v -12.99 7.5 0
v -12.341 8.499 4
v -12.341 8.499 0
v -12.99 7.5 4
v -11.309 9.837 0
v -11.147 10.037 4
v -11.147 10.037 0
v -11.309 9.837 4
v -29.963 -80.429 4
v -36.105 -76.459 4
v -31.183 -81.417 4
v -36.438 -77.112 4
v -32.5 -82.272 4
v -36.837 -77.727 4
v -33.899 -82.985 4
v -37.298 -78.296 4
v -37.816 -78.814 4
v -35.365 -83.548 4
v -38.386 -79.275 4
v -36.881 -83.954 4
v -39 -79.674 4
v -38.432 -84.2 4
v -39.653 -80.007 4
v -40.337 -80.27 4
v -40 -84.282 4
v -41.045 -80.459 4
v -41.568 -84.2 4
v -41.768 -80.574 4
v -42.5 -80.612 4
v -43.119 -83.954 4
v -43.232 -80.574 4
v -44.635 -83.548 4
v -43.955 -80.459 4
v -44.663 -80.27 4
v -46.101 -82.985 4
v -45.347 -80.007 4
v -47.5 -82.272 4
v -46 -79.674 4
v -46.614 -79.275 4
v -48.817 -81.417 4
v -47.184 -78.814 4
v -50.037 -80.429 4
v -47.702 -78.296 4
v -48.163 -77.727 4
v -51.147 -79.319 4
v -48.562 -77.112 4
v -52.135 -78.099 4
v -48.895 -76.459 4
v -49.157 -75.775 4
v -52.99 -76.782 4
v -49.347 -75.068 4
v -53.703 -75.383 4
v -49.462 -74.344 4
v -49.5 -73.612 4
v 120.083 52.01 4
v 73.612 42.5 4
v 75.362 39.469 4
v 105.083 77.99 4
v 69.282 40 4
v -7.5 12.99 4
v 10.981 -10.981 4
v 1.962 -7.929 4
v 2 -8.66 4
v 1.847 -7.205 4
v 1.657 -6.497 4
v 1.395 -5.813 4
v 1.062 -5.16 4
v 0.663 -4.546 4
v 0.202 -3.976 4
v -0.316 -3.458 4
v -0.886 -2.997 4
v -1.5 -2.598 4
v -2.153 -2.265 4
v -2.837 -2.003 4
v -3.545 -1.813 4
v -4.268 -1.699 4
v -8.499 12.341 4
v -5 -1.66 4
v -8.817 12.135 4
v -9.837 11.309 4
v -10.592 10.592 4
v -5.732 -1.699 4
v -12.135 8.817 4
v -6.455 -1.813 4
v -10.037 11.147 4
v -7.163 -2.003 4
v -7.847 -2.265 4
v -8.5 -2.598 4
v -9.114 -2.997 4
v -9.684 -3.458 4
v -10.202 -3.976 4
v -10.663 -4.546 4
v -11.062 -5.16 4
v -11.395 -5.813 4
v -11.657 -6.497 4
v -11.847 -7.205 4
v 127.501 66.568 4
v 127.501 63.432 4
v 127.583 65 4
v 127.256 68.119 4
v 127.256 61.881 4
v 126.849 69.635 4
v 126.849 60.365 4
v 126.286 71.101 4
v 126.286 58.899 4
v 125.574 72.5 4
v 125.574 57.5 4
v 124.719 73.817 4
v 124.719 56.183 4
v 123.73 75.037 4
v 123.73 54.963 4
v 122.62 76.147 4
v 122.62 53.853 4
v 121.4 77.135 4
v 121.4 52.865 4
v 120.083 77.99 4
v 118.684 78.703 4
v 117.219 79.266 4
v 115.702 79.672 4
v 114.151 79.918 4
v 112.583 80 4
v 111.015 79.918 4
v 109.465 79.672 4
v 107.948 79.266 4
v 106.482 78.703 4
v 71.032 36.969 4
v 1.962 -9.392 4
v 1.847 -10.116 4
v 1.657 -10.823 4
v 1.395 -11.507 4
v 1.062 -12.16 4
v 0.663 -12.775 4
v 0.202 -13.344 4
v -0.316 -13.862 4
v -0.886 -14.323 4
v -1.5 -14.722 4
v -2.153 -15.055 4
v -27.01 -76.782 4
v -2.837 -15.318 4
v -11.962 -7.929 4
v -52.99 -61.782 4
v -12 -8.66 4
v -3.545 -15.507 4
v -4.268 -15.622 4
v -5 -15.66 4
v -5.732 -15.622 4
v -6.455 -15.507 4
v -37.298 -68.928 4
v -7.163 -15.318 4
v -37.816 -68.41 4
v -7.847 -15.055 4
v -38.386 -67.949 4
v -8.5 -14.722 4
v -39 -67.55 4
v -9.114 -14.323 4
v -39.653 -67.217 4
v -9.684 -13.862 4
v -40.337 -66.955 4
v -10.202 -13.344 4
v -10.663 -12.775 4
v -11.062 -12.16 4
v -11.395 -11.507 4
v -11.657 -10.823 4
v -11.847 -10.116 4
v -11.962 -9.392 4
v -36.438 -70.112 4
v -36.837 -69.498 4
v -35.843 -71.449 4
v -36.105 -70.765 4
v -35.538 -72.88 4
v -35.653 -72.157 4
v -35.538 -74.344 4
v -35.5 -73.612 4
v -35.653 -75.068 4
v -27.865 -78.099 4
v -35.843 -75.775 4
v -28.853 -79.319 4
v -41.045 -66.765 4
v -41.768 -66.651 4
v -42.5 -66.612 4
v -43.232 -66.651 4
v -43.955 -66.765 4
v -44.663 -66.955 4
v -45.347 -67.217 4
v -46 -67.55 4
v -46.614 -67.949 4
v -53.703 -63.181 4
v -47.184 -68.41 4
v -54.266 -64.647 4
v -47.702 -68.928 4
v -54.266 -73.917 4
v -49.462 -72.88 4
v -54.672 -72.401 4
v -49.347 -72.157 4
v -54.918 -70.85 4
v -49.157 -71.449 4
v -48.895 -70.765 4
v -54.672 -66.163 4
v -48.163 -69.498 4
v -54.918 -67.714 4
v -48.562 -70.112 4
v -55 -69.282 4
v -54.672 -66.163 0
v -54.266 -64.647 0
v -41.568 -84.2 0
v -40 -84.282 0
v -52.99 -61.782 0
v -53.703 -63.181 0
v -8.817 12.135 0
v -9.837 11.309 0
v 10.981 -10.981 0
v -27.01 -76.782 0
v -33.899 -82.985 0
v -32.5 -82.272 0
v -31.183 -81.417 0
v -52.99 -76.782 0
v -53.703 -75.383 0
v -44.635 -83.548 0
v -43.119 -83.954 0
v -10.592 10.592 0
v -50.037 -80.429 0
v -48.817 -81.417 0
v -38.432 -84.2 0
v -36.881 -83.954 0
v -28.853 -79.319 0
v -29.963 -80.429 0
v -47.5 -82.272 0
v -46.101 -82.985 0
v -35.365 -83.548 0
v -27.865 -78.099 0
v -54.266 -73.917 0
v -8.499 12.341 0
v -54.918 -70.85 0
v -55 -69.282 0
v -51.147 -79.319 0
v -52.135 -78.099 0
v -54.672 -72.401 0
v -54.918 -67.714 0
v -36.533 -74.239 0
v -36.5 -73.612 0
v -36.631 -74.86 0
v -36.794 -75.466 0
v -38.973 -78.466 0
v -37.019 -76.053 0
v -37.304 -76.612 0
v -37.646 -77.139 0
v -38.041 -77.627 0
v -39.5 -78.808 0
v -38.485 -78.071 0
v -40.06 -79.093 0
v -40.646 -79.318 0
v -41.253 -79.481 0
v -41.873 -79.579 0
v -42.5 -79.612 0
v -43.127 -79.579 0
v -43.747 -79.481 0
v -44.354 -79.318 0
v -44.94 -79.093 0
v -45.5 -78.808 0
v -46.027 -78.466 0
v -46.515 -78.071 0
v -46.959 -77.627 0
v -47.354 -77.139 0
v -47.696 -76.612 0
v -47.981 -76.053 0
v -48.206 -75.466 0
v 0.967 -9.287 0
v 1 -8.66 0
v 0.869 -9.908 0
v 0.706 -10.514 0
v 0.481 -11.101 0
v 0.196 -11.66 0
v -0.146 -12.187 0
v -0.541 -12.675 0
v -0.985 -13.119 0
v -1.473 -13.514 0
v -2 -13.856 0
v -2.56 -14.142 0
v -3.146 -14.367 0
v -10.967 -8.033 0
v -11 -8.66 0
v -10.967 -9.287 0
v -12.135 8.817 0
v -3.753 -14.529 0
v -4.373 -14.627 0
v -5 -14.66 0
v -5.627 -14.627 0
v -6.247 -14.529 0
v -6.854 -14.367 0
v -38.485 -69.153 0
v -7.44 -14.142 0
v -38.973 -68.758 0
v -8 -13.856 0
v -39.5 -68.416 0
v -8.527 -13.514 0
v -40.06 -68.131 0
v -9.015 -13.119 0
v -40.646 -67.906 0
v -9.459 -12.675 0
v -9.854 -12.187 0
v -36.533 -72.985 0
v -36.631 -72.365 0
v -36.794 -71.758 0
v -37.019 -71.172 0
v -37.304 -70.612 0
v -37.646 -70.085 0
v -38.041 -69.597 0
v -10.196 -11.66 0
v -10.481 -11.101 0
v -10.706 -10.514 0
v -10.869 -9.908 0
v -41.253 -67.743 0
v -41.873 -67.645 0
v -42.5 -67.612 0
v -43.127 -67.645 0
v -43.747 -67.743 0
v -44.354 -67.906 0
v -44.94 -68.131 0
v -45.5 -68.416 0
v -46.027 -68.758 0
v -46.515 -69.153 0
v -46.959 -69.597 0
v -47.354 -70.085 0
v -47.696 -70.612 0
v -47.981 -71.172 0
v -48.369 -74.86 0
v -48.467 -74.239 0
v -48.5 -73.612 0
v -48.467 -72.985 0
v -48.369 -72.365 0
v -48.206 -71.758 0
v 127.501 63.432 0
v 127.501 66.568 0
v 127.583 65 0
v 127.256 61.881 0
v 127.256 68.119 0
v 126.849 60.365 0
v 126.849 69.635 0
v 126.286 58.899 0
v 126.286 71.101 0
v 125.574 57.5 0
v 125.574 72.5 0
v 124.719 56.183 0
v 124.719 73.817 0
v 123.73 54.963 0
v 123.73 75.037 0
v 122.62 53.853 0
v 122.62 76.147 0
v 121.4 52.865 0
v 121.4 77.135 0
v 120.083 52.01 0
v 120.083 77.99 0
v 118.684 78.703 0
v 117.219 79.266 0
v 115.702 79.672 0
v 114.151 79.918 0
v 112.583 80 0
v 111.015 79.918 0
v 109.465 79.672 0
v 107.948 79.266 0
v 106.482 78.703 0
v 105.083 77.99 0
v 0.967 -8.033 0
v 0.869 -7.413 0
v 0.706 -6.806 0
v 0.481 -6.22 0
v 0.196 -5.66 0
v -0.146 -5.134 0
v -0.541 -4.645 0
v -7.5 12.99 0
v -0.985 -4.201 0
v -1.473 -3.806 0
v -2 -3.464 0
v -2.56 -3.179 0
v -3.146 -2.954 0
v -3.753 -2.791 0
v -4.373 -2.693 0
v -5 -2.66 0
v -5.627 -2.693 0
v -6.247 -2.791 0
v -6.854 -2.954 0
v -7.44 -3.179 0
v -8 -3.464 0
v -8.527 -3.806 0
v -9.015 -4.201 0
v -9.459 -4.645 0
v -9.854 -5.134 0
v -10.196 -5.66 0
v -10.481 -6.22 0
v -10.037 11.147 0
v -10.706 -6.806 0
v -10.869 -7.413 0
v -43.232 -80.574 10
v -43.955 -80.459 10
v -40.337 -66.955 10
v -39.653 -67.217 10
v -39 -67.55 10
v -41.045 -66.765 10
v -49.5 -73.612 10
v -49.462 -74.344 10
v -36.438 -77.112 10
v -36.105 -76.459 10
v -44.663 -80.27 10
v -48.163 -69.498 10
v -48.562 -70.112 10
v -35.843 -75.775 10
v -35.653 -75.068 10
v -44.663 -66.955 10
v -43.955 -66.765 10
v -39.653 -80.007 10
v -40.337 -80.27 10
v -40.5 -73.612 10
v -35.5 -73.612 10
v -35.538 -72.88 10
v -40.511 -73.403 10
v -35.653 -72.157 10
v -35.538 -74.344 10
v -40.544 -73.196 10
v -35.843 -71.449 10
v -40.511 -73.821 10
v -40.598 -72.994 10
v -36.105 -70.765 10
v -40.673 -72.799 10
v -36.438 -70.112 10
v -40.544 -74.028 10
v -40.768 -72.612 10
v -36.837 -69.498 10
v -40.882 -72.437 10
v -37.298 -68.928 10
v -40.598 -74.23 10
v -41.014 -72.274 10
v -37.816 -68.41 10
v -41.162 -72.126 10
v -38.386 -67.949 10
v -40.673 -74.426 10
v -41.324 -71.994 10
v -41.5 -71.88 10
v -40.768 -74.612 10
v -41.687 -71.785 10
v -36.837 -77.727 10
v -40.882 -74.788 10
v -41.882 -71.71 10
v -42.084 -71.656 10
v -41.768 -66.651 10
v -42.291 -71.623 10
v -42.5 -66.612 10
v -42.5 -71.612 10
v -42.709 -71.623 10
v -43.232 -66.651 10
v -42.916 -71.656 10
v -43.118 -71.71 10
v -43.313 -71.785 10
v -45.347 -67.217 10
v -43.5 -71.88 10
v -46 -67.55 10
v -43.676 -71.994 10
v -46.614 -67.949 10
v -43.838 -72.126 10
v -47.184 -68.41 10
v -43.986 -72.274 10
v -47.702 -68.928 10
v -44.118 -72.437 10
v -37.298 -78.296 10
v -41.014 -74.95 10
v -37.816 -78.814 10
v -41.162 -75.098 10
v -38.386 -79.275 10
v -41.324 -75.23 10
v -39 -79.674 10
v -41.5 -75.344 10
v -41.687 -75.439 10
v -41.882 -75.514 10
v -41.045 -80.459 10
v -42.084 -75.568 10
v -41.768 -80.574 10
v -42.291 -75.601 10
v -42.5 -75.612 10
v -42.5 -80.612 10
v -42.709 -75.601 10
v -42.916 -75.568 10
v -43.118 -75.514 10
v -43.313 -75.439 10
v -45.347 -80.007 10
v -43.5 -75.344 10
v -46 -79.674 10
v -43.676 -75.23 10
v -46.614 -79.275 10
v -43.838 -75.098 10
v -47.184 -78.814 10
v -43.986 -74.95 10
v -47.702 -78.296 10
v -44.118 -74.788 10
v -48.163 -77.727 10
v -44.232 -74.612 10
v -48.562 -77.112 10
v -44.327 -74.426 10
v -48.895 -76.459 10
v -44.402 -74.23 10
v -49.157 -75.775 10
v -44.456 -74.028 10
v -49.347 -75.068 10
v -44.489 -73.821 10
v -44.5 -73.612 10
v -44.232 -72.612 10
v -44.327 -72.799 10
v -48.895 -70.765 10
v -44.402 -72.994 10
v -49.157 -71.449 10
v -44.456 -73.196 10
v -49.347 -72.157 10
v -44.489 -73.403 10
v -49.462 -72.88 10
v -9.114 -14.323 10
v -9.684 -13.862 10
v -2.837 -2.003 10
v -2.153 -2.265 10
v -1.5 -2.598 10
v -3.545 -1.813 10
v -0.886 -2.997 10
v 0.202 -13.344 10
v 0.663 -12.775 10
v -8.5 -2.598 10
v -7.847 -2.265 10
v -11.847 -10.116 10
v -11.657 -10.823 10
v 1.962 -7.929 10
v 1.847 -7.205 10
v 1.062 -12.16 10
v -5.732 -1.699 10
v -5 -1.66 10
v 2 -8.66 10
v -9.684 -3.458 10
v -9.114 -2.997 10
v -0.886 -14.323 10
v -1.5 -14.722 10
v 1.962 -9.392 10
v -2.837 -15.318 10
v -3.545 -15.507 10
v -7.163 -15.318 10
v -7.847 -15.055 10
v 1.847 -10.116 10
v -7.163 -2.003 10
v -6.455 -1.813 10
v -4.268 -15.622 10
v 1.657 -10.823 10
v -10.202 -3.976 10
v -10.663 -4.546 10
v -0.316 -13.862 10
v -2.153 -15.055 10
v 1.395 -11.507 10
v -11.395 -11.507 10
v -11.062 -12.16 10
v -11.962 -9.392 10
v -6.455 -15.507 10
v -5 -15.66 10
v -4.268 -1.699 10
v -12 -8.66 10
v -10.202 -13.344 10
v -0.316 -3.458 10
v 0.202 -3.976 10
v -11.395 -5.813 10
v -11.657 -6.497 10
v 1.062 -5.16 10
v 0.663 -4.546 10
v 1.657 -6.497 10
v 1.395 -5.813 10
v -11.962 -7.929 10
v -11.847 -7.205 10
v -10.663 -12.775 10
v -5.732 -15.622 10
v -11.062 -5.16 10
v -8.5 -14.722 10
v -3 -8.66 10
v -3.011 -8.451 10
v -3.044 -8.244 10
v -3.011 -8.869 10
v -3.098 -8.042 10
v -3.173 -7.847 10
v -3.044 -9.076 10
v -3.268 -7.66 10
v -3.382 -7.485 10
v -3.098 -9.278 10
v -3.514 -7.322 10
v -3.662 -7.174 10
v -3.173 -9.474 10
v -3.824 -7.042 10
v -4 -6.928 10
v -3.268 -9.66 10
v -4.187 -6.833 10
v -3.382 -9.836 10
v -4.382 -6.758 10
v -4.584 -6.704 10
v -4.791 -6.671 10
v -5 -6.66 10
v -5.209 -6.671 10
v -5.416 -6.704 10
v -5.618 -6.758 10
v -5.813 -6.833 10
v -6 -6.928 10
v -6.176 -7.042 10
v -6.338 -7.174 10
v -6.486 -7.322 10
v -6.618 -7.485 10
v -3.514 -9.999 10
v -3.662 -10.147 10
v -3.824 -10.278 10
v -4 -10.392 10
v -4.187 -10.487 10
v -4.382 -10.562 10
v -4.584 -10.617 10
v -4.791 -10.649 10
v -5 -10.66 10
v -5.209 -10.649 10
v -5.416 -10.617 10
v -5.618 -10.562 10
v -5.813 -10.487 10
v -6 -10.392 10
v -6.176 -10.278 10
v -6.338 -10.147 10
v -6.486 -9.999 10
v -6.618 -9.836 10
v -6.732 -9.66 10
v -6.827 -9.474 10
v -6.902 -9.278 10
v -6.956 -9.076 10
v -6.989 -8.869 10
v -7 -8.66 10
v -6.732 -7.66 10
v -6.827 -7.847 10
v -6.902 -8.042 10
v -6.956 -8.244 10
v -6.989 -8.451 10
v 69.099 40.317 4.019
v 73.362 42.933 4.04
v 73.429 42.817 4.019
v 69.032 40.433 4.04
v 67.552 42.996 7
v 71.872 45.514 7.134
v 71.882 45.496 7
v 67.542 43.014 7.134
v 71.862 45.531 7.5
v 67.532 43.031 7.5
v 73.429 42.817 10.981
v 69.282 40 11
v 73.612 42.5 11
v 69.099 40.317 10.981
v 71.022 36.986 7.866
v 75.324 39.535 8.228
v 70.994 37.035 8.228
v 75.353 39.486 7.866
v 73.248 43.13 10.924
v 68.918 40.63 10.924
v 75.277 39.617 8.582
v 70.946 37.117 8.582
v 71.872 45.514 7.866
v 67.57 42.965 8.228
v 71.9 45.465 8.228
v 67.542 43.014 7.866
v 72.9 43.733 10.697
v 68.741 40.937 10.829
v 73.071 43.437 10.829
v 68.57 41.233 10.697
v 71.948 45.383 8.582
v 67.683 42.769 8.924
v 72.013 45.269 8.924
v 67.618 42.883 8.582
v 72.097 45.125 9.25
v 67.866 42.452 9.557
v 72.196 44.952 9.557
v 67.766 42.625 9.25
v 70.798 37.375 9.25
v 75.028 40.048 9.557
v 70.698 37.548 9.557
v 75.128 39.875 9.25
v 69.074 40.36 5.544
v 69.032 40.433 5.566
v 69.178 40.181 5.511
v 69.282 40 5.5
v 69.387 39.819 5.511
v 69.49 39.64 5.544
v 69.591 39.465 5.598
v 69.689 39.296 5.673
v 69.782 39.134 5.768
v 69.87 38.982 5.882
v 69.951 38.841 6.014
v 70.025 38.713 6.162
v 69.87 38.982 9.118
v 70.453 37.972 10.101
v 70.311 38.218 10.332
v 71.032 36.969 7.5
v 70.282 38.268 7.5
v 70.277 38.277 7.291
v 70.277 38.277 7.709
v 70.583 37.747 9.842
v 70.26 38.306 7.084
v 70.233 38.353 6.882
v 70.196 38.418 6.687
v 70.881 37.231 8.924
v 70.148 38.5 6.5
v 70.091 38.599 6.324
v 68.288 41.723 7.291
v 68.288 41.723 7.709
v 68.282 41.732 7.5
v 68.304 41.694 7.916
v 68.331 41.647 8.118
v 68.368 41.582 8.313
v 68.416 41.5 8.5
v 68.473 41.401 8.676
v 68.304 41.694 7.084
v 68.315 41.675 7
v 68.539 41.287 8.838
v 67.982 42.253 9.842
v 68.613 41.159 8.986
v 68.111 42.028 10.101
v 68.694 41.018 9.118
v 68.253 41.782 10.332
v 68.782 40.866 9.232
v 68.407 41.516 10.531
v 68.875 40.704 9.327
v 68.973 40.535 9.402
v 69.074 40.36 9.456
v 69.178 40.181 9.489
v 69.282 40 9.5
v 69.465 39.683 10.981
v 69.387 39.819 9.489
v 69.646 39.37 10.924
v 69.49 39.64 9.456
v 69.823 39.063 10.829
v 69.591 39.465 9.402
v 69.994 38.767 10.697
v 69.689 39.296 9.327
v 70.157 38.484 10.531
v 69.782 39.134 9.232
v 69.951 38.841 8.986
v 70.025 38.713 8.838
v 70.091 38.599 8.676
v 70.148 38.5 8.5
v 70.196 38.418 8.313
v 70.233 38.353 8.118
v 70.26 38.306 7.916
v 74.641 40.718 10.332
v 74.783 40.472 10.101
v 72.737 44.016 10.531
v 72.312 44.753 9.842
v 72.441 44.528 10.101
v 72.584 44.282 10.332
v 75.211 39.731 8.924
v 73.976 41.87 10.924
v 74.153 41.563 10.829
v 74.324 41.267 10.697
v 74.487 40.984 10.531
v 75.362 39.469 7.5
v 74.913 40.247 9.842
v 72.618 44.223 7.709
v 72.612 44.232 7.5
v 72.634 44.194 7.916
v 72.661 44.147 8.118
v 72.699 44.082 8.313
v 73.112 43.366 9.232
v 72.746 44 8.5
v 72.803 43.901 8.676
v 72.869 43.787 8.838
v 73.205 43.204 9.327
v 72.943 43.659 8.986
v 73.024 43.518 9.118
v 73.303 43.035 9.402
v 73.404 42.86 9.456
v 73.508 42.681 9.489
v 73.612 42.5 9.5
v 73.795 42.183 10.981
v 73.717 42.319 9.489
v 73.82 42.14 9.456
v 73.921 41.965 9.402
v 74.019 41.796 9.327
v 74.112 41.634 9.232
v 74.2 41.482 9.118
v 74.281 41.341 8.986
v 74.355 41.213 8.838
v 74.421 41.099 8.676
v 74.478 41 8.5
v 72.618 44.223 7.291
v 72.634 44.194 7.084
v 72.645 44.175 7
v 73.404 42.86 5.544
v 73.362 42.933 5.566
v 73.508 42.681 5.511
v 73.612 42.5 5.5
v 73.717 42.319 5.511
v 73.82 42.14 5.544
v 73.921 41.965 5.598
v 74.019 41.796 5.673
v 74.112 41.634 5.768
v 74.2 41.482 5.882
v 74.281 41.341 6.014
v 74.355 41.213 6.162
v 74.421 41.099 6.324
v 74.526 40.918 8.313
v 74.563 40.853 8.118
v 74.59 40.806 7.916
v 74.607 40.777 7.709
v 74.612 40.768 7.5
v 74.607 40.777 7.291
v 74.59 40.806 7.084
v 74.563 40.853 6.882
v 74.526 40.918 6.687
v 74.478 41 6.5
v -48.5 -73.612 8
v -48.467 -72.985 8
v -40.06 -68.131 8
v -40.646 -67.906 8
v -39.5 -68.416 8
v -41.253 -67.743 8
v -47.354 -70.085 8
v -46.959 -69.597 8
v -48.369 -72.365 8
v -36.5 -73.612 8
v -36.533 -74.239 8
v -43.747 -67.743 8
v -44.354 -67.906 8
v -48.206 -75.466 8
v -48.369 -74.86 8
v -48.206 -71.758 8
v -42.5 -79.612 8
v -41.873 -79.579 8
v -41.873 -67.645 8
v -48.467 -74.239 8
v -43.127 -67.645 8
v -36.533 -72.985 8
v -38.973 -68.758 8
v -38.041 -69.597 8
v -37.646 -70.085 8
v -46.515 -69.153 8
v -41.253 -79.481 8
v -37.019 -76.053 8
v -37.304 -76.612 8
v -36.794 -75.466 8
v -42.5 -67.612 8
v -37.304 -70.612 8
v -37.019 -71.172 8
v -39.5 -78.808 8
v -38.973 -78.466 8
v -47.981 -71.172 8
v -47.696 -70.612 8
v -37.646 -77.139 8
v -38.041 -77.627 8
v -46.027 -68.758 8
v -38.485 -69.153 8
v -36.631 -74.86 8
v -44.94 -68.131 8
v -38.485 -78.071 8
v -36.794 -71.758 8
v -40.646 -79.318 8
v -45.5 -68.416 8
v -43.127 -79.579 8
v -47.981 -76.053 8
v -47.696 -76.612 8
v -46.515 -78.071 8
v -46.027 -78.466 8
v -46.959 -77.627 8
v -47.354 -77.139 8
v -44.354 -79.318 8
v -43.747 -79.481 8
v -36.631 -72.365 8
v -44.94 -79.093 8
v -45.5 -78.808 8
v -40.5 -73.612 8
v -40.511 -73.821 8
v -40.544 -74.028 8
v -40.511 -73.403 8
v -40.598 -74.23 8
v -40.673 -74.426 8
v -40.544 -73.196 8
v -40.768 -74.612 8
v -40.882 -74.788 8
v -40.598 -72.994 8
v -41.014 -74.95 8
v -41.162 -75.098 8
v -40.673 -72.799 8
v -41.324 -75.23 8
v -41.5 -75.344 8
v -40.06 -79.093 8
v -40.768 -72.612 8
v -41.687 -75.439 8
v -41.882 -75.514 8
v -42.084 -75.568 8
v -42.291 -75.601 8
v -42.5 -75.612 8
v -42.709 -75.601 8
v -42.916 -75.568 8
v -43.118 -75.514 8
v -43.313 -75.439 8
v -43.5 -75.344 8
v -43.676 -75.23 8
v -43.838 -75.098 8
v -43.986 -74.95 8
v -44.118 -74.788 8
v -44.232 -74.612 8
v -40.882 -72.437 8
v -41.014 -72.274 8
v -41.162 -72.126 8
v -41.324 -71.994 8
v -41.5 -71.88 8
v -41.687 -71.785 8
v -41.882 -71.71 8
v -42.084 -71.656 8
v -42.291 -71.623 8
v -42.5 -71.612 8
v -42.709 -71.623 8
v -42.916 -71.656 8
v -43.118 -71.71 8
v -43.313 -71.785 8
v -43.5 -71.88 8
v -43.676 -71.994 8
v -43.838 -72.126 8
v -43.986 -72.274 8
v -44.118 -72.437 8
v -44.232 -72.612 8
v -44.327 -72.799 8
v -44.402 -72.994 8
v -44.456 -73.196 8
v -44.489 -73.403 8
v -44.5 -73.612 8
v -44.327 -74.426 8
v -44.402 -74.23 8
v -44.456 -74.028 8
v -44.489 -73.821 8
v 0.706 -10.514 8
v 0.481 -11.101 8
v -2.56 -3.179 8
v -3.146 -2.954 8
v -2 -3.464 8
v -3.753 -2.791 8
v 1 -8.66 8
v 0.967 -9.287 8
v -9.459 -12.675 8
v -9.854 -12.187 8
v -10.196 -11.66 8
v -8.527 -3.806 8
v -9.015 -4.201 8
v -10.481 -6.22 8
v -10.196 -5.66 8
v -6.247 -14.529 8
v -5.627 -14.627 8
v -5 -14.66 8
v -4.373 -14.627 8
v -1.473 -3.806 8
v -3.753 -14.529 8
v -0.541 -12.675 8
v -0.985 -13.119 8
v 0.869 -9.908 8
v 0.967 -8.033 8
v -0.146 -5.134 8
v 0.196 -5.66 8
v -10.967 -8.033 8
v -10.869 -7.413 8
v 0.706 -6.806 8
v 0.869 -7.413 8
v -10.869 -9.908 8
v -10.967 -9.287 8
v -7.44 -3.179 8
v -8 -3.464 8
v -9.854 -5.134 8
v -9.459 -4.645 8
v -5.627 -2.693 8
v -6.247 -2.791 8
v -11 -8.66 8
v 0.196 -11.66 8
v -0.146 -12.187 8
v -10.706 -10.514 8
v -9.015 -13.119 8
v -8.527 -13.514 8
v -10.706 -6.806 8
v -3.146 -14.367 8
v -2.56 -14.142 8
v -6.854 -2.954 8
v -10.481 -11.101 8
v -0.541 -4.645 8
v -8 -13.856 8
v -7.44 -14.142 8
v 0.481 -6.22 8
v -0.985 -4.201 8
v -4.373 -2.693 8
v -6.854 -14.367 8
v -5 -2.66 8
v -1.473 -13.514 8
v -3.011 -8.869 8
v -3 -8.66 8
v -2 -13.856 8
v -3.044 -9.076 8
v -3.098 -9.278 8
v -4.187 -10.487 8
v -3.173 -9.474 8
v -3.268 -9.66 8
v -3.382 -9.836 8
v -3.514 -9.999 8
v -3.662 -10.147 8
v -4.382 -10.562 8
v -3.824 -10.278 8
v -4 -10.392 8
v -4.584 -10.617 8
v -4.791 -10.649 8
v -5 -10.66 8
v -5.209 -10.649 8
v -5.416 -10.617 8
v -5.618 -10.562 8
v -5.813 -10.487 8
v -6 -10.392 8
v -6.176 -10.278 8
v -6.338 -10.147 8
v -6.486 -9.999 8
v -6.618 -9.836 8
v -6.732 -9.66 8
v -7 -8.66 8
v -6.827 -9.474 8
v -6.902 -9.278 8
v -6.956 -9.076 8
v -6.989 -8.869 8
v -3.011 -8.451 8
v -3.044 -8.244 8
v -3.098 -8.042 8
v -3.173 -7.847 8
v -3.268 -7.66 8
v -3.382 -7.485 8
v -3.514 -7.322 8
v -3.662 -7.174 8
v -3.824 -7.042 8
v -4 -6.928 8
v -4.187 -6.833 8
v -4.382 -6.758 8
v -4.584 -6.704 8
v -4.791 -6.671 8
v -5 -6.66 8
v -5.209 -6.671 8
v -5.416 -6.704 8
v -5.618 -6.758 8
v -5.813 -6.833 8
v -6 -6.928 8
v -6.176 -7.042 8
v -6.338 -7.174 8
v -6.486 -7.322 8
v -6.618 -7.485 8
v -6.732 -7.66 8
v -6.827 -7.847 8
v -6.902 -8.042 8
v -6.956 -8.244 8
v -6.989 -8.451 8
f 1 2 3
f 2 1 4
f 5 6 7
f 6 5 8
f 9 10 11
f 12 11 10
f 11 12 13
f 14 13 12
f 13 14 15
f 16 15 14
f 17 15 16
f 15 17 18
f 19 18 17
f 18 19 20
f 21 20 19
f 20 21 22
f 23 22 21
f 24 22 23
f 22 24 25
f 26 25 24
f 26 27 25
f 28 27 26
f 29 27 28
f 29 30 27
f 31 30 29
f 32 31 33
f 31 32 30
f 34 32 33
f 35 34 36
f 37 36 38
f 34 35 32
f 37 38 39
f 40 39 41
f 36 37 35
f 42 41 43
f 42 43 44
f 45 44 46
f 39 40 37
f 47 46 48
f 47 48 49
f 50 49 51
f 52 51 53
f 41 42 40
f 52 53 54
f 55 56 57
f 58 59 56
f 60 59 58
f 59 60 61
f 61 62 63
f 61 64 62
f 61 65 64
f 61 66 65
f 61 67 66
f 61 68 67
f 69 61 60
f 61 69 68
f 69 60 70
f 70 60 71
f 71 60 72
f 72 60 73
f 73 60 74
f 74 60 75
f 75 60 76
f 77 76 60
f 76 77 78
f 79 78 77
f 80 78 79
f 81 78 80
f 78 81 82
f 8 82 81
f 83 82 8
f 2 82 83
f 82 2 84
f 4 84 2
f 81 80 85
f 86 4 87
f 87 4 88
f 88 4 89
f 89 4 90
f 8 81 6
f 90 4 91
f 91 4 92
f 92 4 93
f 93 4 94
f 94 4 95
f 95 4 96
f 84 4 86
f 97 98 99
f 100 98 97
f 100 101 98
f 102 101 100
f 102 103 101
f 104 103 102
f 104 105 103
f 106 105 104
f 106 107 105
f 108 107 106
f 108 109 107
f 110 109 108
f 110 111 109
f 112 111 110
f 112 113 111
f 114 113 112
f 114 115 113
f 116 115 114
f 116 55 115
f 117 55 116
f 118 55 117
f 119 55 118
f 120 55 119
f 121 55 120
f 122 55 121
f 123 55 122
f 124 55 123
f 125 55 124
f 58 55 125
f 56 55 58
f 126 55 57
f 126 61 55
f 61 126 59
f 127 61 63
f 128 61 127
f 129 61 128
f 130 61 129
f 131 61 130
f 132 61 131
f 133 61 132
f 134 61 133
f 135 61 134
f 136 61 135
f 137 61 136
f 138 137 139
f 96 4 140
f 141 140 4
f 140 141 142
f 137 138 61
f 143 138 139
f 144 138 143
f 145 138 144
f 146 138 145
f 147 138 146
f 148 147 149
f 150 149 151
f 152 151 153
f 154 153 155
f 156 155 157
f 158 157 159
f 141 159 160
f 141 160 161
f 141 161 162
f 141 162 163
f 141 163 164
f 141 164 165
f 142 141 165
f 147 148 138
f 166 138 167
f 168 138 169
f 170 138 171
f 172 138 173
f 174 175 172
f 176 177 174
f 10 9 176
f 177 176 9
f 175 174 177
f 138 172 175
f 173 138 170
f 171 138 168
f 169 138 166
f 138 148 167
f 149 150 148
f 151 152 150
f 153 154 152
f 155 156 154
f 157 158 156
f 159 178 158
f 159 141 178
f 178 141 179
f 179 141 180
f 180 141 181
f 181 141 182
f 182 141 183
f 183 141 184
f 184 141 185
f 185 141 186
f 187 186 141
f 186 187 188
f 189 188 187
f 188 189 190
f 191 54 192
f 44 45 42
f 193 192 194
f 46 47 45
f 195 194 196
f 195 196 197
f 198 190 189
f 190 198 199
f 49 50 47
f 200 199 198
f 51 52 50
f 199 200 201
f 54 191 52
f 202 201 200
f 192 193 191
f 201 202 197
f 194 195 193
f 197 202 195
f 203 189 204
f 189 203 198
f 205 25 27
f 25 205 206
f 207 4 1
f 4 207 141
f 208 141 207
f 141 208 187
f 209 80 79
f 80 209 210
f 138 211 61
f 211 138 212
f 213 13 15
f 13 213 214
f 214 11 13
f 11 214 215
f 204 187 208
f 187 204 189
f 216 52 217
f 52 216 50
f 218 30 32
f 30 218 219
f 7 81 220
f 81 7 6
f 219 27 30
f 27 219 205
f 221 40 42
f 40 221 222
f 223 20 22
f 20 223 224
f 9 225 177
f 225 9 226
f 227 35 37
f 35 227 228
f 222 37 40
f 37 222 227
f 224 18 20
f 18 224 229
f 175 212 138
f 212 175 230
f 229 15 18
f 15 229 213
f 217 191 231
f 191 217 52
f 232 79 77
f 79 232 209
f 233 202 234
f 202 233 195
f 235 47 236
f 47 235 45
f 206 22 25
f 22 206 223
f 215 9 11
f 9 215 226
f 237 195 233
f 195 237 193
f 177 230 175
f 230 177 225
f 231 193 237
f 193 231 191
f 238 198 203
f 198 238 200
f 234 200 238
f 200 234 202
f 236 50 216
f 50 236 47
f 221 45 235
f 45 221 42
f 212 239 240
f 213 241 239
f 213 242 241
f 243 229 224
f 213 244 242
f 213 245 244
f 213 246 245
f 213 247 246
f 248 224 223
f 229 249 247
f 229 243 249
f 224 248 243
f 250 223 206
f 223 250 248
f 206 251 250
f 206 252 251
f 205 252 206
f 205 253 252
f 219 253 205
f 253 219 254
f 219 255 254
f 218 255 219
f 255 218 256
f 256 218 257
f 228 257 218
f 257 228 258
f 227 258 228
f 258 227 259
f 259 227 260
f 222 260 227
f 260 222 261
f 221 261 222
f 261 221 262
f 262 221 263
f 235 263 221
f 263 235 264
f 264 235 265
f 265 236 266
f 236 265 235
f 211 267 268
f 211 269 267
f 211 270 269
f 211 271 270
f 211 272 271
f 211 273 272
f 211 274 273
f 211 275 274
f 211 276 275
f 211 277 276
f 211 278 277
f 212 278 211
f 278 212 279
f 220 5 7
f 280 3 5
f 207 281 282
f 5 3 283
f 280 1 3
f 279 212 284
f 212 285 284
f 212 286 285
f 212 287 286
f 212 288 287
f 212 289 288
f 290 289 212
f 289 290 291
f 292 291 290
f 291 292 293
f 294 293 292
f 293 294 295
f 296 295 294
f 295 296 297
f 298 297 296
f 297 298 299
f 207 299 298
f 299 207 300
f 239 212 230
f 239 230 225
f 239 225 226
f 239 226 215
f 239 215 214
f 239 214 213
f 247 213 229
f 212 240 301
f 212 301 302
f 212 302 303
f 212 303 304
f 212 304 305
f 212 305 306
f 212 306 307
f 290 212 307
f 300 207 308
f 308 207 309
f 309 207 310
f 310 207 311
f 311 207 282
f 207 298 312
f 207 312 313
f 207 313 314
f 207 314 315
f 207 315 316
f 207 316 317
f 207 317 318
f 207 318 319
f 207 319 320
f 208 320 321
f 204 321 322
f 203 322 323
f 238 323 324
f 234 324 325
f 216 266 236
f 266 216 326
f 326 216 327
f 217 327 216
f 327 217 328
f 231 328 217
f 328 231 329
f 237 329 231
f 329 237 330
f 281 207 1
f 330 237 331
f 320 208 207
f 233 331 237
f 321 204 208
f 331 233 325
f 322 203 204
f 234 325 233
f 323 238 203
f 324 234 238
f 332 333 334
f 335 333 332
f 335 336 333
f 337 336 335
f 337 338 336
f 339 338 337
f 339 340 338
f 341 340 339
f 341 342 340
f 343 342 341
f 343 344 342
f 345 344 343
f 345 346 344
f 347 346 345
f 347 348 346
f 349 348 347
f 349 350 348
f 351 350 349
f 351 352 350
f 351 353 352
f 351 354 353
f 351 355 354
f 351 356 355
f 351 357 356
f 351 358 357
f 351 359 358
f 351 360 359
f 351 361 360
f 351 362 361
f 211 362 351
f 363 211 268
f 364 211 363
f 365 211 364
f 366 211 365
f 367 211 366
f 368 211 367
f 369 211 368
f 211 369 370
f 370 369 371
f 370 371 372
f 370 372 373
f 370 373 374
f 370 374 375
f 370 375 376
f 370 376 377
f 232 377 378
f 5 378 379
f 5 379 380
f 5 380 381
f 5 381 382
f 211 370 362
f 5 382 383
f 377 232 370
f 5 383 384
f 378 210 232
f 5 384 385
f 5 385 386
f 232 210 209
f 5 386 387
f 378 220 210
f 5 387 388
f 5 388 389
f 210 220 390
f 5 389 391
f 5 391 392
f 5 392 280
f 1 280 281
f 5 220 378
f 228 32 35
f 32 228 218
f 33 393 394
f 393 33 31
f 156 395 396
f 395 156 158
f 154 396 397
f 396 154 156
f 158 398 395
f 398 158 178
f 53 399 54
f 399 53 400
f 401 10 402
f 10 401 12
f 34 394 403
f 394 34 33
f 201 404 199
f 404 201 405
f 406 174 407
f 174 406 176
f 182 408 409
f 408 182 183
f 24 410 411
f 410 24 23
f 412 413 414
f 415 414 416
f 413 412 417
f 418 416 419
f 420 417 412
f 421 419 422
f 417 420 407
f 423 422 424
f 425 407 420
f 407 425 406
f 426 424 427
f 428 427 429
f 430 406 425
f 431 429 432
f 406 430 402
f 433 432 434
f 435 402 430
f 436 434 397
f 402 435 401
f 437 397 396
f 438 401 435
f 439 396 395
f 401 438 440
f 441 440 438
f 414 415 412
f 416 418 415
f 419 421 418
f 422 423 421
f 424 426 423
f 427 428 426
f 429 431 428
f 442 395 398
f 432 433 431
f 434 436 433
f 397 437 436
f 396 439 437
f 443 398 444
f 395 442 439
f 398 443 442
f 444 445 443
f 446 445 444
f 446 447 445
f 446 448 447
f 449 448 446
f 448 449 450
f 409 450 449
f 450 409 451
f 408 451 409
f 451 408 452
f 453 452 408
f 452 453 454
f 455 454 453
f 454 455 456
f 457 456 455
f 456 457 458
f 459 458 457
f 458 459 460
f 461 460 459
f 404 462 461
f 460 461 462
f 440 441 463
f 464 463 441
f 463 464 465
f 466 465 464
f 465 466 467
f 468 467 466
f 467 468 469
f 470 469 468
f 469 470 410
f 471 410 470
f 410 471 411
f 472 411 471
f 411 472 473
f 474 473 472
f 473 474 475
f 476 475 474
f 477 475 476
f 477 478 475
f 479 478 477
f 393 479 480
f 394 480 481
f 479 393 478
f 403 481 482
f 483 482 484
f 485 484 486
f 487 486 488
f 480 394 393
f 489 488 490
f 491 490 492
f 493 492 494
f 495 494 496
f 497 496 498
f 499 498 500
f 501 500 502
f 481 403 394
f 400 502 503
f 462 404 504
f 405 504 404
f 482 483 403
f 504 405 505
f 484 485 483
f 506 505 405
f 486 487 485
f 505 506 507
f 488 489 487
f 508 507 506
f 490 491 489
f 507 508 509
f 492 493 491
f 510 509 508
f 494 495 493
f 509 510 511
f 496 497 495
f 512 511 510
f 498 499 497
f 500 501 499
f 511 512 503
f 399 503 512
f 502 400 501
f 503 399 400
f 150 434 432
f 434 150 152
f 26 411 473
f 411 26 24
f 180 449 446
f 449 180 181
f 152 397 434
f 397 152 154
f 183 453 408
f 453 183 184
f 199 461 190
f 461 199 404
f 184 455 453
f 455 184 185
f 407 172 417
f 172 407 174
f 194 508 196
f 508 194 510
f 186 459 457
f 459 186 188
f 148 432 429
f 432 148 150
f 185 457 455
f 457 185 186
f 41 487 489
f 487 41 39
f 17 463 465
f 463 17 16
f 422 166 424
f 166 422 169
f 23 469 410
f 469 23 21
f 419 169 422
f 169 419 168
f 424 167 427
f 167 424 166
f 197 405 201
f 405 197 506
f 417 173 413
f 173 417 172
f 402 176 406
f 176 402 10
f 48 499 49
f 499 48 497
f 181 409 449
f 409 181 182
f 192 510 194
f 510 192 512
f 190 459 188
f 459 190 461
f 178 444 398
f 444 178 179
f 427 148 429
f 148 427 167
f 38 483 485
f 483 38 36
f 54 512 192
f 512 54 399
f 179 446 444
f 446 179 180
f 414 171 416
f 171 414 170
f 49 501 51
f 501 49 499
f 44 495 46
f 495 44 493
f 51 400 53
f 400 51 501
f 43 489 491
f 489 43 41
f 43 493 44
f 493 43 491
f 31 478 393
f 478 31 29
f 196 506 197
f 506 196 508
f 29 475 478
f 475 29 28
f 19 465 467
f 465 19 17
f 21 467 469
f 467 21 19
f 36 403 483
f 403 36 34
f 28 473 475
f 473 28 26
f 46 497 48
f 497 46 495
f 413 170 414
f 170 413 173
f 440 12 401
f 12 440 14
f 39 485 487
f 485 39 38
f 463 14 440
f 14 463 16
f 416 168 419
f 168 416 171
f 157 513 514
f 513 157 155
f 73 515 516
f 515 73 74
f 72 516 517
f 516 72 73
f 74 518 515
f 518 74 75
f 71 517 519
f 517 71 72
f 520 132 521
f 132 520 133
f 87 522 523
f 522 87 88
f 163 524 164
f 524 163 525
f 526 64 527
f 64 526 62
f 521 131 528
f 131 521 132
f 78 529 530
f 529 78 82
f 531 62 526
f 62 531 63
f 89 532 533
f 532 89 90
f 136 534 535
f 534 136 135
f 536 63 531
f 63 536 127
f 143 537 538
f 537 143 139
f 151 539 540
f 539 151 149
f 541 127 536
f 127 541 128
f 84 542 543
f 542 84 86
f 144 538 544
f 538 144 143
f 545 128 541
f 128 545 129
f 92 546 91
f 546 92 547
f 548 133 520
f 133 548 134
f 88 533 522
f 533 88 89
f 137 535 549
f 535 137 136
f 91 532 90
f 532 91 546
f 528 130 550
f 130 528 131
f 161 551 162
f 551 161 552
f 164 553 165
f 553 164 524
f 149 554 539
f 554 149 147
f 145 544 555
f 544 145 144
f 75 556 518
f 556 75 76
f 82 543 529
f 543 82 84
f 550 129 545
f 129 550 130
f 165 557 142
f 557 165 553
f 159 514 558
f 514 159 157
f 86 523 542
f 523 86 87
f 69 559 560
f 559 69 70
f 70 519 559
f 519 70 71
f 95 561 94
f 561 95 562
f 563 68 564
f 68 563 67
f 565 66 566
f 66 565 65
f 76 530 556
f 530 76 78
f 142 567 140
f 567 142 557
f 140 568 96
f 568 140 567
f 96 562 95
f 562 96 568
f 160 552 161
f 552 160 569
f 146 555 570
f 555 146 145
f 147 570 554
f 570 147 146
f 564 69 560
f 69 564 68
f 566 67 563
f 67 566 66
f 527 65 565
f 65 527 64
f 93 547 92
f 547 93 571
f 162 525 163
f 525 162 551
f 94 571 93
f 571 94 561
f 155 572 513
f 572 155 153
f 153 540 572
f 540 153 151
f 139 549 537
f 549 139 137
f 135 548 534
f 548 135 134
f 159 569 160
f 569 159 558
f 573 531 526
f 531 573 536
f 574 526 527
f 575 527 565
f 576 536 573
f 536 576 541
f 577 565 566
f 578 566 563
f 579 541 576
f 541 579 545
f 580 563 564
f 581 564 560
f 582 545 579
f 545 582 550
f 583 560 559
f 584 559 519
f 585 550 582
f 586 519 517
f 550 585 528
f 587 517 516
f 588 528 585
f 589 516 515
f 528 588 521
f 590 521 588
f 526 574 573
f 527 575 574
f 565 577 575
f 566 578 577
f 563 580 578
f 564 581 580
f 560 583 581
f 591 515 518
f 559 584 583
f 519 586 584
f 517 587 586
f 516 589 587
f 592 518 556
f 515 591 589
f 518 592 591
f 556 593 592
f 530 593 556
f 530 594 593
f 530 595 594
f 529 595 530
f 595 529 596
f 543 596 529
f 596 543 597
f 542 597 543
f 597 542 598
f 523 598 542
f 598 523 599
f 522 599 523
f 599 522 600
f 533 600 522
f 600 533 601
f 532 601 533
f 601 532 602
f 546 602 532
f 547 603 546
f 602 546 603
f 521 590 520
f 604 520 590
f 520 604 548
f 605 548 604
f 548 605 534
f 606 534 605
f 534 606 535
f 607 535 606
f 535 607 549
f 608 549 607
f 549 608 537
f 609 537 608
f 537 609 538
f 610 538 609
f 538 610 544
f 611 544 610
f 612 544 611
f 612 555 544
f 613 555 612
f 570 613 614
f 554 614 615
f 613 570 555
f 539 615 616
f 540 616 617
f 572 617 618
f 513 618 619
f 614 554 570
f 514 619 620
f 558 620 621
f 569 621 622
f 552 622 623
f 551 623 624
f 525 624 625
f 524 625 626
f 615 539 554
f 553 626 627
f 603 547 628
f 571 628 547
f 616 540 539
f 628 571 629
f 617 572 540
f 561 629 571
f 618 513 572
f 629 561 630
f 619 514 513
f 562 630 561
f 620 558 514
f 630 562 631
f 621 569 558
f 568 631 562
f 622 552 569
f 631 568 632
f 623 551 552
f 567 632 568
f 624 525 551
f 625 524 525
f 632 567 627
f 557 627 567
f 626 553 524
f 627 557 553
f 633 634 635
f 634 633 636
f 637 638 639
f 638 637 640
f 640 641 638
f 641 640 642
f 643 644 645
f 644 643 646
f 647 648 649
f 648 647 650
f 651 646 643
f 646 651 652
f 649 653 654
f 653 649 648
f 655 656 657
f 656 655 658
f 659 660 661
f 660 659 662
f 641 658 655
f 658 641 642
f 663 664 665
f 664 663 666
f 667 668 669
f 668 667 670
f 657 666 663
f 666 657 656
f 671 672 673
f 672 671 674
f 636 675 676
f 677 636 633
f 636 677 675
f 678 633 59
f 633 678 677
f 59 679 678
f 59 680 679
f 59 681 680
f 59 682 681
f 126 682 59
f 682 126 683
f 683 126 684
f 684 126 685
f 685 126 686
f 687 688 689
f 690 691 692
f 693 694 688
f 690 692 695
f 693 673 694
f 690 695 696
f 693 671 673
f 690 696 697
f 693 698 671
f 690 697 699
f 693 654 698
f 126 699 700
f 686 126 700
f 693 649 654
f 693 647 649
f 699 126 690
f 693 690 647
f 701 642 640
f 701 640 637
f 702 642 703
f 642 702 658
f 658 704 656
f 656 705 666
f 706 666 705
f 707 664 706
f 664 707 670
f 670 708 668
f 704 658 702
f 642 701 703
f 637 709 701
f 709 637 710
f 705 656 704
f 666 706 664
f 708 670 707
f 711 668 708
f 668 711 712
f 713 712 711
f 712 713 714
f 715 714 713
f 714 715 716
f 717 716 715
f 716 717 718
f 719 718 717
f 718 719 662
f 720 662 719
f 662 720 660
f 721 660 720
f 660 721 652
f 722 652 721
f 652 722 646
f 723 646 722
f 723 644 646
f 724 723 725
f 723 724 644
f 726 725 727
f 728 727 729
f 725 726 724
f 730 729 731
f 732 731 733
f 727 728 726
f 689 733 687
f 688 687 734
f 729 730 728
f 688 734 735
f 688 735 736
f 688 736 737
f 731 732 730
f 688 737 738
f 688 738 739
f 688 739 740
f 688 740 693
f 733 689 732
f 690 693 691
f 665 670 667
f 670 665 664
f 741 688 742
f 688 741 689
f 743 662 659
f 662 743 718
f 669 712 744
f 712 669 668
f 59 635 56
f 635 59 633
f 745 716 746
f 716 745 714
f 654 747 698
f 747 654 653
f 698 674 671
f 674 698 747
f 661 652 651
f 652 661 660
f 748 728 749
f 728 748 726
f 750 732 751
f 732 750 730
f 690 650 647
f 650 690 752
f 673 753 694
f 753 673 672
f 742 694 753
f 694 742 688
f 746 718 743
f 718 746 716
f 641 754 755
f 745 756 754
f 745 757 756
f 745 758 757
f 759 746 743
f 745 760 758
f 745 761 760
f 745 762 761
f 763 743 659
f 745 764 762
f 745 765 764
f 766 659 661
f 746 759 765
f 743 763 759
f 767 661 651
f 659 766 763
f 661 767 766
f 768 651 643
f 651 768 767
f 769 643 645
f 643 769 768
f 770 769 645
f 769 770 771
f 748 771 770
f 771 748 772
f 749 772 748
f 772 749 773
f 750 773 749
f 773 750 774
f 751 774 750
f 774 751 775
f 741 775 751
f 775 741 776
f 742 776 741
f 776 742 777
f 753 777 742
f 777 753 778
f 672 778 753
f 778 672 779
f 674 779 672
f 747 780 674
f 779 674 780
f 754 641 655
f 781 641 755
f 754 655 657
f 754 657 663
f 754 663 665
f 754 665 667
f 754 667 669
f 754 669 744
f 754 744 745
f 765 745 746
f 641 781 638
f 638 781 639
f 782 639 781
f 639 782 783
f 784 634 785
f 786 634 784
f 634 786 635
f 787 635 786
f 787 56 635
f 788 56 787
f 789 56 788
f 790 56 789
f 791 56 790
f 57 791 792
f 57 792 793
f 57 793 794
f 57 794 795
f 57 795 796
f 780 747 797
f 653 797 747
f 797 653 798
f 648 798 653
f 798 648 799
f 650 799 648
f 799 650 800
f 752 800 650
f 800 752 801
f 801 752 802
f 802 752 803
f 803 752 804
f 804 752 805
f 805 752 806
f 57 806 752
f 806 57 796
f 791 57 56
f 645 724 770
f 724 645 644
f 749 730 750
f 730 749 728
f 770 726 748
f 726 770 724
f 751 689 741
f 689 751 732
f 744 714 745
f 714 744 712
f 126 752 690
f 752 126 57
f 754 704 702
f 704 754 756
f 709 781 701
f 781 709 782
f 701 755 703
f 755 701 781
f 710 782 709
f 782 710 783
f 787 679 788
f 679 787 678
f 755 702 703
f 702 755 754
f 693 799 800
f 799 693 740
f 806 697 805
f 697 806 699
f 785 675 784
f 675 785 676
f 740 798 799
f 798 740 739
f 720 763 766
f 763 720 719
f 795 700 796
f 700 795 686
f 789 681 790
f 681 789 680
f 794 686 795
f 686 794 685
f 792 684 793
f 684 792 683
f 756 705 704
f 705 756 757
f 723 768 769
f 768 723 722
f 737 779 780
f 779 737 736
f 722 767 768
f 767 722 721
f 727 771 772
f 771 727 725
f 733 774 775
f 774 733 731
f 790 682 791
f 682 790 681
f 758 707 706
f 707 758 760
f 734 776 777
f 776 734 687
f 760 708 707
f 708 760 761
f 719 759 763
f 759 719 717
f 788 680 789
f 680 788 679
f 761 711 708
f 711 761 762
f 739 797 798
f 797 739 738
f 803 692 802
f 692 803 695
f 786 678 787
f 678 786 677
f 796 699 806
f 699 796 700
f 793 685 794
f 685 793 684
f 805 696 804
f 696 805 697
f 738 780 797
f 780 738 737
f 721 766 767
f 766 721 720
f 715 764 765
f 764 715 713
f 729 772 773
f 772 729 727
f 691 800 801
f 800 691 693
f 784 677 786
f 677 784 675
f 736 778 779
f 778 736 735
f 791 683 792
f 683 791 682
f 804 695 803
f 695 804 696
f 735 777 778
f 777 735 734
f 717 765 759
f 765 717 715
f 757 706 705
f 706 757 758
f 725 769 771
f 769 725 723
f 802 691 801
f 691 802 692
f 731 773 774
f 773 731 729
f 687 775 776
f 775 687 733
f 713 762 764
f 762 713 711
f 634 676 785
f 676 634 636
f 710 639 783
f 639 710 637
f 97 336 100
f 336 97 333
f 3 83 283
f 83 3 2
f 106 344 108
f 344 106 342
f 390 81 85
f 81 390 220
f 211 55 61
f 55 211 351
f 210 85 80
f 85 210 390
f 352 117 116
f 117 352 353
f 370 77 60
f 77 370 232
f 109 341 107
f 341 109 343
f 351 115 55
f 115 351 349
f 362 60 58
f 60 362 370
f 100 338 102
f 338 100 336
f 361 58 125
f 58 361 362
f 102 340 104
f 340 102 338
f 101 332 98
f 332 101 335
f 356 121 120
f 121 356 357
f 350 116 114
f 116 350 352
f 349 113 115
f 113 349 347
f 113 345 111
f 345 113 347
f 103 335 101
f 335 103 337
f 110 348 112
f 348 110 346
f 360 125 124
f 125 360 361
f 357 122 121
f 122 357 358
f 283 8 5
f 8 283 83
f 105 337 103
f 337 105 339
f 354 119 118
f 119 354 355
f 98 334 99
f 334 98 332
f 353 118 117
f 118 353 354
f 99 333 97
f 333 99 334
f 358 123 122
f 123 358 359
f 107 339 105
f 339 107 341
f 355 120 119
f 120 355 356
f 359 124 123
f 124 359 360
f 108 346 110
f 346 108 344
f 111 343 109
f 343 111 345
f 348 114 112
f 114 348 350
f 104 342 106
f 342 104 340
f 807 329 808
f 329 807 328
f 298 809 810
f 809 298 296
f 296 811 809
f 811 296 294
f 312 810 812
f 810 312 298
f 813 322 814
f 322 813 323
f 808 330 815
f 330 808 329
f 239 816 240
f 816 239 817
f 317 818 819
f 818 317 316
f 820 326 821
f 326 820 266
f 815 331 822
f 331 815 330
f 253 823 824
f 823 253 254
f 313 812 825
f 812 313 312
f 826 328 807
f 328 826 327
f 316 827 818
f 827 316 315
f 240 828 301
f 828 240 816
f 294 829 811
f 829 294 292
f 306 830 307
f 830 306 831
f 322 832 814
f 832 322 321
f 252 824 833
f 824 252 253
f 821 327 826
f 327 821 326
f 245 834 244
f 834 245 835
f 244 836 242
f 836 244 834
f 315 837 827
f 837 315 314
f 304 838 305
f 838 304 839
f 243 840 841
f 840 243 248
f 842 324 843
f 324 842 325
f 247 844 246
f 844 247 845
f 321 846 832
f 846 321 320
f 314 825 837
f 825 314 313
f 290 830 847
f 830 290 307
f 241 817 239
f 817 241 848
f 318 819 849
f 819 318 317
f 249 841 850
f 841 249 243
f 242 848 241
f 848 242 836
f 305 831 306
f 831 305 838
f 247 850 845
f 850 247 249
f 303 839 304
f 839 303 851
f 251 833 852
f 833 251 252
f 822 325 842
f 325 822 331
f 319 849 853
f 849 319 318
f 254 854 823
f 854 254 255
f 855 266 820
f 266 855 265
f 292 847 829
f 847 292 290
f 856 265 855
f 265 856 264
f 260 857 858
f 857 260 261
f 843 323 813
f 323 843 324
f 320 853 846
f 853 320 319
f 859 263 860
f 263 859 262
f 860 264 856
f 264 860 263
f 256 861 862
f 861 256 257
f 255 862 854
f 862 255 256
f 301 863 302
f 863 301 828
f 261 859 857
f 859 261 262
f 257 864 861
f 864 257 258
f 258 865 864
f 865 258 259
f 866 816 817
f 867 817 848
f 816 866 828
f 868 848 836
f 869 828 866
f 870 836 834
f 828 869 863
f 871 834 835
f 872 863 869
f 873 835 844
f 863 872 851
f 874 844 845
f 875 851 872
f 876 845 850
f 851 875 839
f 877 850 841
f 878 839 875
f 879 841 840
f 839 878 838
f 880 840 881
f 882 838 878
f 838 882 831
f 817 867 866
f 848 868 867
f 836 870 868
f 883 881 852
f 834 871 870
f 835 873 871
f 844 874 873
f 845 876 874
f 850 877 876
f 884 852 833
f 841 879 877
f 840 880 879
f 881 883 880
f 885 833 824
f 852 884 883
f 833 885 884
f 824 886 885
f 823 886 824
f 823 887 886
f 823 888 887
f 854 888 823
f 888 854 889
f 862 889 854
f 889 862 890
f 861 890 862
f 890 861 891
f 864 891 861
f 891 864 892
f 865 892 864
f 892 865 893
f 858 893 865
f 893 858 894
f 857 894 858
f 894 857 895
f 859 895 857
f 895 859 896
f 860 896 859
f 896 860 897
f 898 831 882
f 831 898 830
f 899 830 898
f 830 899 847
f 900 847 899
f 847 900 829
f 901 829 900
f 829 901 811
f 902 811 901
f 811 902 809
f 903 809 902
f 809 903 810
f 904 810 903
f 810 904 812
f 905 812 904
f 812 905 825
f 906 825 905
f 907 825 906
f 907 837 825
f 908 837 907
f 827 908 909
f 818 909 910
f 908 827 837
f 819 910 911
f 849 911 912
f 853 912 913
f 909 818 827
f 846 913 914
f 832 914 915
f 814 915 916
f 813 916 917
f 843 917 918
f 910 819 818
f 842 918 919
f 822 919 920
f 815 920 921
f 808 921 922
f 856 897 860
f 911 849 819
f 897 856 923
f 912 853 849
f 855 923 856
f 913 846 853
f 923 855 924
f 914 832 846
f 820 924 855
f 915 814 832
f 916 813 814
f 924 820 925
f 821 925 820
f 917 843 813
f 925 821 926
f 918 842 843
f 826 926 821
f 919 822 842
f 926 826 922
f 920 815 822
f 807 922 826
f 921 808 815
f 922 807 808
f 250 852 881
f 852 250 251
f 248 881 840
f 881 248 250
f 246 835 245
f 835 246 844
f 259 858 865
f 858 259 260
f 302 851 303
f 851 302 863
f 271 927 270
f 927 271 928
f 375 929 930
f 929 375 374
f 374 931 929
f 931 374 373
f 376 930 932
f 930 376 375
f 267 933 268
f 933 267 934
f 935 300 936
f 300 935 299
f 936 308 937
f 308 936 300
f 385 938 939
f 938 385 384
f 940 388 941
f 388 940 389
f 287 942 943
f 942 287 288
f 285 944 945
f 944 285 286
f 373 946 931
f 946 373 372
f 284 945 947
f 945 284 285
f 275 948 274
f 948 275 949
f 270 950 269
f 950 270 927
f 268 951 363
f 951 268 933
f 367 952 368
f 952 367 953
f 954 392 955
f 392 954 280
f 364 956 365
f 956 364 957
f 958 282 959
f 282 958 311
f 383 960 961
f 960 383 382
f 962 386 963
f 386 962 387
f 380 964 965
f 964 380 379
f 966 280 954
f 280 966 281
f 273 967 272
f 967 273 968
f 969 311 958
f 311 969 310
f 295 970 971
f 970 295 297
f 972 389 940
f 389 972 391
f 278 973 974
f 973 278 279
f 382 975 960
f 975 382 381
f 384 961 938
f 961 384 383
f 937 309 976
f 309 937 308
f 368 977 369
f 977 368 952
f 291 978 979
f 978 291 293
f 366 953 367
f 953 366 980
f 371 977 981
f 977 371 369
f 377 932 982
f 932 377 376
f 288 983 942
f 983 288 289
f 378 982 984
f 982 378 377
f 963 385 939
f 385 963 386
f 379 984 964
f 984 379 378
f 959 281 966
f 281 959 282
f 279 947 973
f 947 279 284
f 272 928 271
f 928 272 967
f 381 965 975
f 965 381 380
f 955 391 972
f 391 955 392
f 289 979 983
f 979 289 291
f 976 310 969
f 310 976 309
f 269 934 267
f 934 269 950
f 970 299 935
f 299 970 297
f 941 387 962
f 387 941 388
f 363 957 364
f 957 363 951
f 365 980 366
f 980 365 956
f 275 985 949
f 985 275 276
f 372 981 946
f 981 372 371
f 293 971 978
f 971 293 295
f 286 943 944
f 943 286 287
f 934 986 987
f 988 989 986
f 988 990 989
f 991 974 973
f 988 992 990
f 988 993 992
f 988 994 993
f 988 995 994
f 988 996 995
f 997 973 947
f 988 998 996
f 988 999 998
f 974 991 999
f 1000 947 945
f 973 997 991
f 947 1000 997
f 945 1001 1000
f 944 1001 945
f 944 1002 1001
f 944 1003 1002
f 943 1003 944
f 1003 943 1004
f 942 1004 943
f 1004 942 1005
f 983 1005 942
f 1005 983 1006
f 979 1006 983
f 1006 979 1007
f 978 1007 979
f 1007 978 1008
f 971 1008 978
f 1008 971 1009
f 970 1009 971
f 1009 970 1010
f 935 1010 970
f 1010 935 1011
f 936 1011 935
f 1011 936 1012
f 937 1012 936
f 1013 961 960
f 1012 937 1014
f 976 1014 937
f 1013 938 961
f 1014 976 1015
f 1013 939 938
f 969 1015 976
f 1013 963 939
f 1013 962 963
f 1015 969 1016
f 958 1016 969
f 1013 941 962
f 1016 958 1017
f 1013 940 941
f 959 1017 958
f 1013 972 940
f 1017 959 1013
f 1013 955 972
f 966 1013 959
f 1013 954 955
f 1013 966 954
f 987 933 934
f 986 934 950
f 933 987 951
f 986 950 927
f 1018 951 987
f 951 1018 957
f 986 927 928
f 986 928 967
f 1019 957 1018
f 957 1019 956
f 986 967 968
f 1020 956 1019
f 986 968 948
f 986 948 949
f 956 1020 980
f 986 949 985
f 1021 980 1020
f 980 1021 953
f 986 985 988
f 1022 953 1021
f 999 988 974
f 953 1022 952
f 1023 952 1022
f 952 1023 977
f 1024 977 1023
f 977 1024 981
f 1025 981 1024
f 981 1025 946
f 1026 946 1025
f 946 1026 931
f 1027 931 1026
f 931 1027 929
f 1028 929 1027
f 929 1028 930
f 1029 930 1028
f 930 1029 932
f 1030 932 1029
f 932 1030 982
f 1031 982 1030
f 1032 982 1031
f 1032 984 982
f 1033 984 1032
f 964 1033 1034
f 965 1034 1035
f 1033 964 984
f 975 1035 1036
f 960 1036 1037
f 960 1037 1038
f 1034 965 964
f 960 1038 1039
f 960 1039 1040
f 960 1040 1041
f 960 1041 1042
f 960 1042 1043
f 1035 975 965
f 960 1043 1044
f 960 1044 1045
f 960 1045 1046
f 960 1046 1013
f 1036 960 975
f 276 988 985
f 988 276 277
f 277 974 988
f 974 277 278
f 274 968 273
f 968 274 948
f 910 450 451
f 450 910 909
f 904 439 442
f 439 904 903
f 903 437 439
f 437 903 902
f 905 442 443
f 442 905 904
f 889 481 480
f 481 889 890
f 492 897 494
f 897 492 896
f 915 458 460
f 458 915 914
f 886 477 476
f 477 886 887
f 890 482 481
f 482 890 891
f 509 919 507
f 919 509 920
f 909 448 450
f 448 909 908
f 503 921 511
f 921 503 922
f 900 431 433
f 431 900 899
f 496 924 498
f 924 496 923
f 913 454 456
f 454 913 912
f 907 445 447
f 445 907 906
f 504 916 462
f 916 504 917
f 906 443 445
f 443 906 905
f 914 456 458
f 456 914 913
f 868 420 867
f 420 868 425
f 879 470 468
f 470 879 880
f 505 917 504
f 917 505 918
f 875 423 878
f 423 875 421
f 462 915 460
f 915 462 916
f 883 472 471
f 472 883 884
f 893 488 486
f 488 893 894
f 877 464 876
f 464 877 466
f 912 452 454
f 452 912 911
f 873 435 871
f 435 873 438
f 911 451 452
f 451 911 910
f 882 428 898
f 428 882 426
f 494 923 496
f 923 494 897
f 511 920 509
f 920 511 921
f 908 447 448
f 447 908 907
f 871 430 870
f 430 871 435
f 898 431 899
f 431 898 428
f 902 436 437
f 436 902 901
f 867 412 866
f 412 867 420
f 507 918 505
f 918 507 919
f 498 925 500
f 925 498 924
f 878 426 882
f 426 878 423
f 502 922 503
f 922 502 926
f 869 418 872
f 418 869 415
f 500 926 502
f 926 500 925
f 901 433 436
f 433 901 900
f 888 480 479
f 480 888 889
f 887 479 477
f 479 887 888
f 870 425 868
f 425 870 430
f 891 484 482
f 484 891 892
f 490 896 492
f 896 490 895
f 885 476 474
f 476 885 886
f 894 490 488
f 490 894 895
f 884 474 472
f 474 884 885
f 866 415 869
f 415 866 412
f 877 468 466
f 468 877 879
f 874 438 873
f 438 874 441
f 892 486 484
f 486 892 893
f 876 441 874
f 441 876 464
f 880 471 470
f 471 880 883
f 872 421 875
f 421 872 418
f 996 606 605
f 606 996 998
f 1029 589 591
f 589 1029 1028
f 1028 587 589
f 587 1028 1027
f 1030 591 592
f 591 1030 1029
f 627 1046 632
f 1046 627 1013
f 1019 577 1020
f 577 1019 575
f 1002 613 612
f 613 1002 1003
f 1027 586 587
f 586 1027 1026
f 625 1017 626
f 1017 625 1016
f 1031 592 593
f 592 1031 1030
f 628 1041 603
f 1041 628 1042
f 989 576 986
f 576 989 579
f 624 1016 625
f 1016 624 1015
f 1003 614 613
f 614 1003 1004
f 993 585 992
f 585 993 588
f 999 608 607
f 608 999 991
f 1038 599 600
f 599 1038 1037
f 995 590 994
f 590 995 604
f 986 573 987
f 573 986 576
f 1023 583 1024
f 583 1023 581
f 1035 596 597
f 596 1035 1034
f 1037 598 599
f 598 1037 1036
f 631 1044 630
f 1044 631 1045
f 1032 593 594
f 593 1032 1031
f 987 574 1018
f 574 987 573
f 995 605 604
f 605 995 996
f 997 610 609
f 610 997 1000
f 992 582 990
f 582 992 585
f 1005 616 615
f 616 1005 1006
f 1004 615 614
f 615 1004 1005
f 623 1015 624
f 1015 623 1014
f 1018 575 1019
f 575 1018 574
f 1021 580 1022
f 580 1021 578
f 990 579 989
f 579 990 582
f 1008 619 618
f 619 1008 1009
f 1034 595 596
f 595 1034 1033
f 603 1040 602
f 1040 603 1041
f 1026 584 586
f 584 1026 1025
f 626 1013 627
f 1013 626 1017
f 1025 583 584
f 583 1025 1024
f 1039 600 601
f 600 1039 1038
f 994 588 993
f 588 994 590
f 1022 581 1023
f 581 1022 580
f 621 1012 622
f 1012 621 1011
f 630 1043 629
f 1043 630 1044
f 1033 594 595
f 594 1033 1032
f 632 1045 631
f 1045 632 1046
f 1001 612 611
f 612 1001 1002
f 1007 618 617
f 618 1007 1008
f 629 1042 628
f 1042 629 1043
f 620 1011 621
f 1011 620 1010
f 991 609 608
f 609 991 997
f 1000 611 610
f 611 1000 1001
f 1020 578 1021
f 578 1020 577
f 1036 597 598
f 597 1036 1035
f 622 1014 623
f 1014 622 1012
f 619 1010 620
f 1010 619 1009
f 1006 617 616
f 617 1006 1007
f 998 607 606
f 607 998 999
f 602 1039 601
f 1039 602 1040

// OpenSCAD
/* [Support] */
// Length of the mount arm. Longer arms will produce more vibrations.
armLenght = 145; // [120:170]

// Mount direction
mountDir = 1; // [1:To the right, -1:To the left]
// Angle between arms. Best suit for me was 30º
armsAngle = 30; // [0:90]

// Include cable holder
cableHolder = 1; // [0:No, 1:Yes]

// Cable diameter
cableDiameter = 4; // [1:10]

// Separation between cable holder and mount support
holderSeparation = 60; //[10:150]

/* [Hidden] */
width=30;
height=4;
corner=10;
len1=armLenght;
len2=95;


rad1=6;
rad2=7;
rad3=2;
h1=6;
h2=2;

// Separation between drills
dist1=75;

// Distance to end from mount base
dist2=10;
dist3=holderSeparation;
$fn=60;

ang=armsAngle*mountDir;

cR=1.5;
cabRad=cableDiameter/2;
cabLen=5;



rotate(a=[0, 0, (mountDir == 1 ? 0 : 180) + mountDir*30]) carMount();

module carMount() {
difference() {
union() {
sideA();
//translate([len1-dist2, 0, height]) mount();
rotate(a=[0, 0, ang]) translate([-len2+width/2, 0, 0]) sideB();
    if (cableHolder==1) translate([len1-dist3, 0, height]) cableHolder();
}
rotate(a=[0, 0, ang]) translate([-len2+width/2, 0, 0]) drills();
}
}

module cableHolder() {
    translate([0, 0, cabRad+cR]) rotate(a=[90, -180, -mountDir*90])
    difference() {
        union() {
    cylinder(r=cabRad+cR, h=cabLen);
    translate([-cabRad-cR, 0, 0]) cube([cabRad+cR, cabRad+cR, cabLen]);
        }
    translate([0, 0, -1]){ cylinder(r=cabRad, h=cabLen+2);
    translate([0.5, 0.5, 0]) cube([cabRad+cR, cabRad+cR, cabLen+2]);}}
}

module sideA() {
hull() {
    cylinder(r=width/2, h=height);
    translate([len1-width/2, 0, 0]) cylinder(r=width/2, h=height);
}    
}

module sideB() {
    hull() {
    cylinder(r=width/2, h=height);
    translate([(len2-width/2), 0, 0]) cylinder(r=width/2, h=height);
    }
    translate([-(width/2-10), 0, height]) cylinder(r=rad2, h=h1);
    translate([-(width/2-10)+dist1, 0, height]) cylinder(r=rad2, h=h1);
}

module drills() {
    translate([-(width/2-10), 0, -1]) cylinder(r=rad1, h=height+h1-h2+1);
    translate([-(width/2-10)+dist1, 0, -1]) cylinder(r=rad1, h=height+h1-h2+1);
    translate([-(width/2-10), 0, 0]) cylinder(r=rad3, h=height+h1+1);
    translate([-(width/2-10)+dist1, 0, 0]) cylinder(r=rad3, h=height+h1+1);
}
